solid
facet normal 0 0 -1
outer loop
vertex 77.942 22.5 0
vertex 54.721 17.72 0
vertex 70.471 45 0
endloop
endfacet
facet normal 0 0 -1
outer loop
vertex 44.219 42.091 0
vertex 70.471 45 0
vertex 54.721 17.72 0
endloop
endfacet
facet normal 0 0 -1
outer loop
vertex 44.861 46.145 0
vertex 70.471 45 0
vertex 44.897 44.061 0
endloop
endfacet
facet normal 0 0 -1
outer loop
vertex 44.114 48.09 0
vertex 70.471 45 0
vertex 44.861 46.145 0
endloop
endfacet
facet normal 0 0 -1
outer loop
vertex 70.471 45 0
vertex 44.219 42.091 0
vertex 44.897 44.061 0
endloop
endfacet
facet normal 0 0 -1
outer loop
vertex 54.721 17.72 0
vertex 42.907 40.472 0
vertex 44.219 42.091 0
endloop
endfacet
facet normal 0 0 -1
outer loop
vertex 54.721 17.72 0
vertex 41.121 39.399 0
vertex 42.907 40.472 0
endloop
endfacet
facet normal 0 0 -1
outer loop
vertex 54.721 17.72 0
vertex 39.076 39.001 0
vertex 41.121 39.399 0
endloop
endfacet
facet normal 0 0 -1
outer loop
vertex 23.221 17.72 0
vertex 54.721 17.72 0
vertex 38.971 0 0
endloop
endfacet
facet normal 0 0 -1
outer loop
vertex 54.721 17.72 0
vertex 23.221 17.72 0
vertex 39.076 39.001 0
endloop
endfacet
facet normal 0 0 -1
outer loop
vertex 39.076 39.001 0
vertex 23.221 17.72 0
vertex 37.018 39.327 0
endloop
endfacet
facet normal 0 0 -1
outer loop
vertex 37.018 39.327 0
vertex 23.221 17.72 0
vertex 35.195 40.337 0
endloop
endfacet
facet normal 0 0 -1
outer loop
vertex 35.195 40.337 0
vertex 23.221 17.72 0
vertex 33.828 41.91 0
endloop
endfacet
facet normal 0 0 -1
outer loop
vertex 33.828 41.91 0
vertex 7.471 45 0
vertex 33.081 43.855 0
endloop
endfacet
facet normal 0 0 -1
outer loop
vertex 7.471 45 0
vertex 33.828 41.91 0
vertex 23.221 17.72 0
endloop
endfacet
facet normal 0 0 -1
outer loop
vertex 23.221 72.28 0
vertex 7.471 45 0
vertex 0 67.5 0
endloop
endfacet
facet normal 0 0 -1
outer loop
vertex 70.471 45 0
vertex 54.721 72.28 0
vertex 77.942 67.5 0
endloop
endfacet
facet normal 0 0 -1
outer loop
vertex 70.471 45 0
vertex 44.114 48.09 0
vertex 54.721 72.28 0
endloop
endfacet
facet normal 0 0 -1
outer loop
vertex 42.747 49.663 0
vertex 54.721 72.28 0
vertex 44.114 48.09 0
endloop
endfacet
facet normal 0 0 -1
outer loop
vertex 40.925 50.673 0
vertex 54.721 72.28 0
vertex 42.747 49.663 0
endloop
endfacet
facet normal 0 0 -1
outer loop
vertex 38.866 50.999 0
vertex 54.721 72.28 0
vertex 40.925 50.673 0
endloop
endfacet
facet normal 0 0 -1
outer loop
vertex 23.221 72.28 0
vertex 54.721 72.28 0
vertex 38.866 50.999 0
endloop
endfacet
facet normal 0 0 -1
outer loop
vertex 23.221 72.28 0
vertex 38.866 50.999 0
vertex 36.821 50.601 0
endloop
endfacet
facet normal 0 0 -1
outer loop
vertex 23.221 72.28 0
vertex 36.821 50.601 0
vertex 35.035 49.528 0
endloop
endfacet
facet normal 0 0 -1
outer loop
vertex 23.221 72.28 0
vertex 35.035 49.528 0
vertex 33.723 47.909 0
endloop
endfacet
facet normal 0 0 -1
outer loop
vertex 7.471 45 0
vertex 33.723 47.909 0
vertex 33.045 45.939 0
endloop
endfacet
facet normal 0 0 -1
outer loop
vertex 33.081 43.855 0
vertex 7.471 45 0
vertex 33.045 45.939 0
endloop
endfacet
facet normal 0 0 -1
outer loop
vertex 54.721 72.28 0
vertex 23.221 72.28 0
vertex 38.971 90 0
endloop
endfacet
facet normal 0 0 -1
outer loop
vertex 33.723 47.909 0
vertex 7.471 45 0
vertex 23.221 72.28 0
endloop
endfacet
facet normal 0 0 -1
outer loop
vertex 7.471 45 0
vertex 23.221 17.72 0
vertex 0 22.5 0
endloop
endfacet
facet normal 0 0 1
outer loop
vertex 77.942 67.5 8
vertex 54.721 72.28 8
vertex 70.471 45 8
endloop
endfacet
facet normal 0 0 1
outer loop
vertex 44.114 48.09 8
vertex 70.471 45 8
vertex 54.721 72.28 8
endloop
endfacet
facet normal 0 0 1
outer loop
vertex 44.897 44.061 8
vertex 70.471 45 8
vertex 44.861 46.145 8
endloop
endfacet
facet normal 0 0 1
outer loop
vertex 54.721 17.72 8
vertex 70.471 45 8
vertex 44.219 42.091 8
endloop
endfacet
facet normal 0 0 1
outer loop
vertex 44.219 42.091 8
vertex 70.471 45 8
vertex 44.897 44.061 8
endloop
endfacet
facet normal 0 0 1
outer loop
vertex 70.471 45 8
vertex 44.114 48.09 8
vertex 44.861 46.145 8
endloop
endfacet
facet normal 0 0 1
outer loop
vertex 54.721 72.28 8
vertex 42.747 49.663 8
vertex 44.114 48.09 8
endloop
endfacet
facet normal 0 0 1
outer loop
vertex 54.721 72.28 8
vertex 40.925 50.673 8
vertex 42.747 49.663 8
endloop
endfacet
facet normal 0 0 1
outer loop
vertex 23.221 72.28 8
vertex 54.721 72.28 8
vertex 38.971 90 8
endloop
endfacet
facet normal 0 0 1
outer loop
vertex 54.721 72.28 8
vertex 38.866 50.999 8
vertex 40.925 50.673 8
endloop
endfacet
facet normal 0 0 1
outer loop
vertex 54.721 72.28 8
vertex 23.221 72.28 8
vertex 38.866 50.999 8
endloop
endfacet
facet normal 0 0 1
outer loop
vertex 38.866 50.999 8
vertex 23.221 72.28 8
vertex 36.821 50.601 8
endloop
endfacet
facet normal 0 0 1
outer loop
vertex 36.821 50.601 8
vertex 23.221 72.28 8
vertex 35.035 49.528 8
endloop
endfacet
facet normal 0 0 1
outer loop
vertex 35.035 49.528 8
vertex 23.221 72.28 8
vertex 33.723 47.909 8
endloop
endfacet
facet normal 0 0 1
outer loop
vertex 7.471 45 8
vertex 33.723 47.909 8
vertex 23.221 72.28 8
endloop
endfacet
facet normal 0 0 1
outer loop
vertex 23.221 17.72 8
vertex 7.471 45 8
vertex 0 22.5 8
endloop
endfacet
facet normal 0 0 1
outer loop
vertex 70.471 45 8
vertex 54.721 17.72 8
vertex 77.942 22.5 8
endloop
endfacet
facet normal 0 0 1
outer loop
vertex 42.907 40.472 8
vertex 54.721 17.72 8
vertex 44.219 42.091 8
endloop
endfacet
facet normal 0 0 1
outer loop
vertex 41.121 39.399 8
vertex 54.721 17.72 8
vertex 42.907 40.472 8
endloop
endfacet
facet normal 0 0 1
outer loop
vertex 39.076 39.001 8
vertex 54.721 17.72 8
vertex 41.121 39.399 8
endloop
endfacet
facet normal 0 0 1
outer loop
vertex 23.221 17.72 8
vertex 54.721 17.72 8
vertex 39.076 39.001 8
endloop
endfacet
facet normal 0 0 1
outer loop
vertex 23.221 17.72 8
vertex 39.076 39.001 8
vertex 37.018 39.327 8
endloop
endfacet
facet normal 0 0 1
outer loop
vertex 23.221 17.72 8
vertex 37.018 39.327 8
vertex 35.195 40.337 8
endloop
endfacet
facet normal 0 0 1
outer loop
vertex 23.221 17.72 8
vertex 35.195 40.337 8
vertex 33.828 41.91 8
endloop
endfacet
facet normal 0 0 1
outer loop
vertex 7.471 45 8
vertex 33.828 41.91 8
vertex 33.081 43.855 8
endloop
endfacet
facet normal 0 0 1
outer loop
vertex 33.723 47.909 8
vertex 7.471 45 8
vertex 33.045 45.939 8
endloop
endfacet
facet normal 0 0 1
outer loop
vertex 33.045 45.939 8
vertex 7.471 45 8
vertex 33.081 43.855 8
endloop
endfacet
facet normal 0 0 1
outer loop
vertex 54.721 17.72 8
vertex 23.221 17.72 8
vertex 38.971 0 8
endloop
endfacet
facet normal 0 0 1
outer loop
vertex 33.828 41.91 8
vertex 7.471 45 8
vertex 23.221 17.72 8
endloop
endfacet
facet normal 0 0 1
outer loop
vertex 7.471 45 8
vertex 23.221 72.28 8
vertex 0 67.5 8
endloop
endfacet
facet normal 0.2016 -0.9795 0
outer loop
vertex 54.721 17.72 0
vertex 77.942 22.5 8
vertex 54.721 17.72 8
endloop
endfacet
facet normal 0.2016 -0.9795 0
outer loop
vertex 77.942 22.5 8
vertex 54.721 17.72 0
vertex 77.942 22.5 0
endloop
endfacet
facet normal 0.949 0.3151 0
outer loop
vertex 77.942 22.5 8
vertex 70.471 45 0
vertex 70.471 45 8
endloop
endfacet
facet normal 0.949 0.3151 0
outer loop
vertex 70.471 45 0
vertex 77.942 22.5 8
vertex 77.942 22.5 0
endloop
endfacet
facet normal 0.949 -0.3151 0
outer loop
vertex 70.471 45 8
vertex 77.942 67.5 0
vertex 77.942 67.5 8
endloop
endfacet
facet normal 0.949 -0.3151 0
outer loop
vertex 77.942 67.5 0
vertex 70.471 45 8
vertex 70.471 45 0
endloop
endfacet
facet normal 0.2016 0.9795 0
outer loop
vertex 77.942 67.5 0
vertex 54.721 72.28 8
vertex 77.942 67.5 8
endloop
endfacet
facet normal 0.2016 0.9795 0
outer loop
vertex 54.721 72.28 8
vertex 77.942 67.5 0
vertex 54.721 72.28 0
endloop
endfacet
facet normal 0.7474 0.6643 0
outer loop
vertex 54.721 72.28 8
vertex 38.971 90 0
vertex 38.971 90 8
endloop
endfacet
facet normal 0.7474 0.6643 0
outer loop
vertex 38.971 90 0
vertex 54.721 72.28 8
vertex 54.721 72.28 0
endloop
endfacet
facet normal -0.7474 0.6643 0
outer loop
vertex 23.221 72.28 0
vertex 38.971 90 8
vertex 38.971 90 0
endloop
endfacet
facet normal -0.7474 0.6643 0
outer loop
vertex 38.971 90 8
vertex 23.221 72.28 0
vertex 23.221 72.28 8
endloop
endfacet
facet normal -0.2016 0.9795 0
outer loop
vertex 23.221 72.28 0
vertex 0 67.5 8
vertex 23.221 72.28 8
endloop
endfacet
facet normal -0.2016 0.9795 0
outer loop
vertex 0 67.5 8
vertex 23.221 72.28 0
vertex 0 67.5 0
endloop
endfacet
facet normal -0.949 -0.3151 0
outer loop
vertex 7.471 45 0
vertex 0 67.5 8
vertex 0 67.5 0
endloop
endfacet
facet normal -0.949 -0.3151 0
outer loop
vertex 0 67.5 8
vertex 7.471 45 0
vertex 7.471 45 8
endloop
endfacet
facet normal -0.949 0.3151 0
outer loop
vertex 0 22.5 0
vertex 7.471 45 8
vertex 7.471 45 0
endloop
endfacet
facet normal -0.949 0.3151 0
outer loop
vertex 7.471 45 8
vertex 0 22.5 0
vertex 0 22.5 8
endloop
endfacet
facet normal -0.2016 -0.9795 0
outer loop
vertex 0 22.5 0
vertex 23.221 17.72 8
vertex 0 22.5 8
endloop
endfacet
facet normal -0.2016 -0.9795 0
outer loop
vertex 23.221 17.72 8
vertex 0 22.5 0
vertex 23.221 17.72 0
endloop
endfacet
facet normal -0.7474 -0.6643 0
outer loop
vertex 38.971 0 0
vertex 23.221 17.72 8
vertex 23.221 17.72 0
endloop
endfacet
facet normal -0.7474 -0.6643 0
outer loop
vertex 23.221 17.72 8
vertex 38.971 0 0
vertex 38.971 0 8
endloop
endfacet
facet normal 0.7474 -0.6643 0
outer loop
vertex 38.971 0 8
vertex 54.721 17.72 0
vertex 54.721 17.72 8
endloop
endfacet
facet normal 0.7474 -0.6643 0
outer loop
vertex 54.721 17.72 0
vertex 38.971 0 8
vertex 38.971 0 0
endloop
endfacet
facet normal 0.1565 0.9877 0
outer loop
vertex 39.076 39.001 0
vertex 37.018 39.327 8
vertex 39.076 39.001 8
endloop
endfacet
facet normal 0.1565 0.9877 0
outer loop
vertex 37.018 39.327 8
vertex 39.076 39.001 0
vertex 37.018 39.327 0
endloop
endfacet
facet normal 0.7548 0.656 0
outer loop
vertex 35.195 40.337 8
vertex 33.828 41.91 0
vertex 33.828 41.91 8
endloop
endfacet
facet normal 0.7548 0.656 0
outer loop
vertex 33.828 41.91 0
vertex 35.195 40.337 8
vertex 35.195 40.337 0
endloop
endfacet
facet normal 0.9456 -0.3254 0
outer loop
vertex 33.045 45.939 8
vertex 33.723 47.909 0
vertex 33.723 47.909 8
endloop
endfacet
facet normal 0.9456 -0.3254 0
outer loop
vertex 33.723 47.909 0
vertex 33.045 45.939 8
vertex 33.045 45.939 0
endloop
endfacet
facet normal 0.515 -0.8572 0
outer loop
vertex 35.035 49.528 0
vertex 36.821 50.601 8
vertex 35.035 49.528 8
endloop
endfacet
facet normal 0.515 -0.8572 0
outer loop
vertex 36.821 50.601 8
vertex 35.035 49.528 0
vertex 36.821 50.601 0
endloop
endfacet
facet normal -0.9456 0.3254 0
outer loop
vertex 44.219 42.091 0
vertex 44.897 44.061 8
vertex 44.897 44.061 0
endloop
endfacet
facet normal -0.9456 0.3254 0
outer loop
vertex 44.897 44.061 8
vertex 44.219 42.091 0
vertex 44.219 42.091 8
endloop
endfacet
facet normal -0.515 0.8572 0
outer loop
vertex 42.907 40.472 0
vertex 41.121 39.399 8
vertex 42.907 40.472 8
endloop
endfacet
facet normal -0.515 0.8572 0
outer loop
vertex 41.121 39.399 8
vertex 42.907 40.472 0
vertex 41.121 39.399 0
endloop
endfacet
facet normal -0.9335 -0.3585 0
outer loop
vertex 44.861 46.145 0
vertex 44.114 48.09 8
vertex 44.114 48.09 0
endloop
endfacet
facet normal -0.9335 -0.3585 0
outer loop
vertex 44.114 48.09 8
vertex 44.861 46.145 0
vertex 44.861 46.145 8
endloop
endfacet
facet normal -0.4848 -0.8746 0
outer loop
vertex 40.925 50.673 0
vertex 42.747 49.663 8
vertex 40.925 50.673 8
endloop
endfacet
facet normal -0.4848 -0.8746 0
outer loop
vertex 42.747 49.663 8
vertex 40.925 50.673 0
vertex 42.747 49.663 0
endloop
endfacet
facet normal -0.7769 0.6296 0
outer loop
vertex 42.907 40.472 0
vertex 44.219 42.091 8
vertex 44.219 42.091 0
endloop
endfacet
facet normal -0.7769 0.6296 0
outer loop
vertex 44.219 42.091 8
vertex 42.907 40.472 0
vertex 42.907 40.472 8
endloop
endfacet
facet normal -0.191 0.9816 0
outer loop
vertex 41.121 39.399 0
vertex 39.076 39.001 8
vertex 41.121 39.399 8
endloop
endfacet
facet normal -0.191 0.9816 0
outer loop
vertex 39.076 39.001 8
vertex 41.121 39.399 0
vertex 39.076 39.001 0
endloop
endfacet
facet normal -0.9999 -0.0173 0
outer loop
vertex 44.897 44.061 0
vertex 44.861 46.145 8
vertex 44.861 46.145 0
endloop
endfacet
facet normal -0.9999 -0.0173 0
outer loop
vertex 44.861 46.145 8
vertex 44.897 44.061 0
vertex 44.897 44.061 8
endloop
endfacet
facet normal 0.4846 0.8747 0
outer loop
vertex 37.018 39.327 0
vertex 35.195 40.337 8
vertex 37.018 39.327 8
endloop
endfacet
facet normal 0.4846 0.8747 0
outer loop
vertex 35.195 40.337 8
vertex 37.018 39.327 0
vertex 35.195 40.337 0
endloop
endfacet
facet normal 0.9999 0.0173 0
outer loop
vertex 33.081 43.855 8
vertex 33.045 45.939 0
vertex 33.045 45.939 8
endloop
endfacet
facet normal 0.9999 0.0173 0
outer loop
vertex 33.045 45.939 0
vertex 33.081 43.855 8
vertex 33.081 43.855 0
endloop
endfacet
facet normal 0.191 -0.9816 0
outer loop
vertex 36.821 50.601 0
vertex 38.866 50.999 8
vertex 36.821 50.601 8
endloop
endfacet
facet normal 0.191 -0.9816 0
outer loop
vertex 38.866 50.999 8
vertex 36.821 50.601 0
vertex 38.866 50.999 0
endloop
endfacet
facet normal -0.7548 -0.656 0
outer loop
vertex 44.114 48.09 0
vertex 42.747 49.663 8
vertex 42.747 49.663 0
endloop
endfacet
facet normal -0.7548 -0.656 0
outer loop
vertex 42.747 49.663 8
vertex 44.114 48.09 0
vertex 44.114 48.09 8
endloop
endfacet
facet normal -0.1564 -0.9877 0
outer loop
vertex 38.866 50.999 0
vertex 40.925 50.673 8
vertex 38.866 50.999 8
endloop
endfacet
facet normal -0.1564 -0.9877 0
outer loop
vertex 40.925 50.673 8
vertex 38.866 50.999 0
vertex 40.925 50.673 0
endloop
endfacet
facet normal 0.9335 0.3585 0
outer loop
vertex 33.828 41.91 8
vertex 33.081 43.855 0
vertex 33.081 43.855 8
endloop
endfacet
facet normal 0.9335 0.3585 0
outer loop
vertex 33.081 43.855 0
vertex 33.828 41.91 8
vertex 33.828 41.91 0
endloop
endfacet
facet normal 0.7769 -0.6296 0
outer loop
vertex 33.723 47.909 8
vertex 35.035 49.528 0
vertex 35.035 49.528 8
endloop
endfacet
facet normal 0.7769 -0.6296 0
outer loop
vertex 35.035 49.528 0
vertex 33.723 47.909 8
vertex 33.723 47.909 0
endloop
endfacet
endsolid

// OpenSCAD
$fn = 32;

// ----------------------------------------------------------------------
// Star wheel: 6-point blunt, R45
// ----------------------------------------------------------------------

// --- parameters (mm) ---
n_points = 6;             // number of points / teeth
r_out = 45;               // tip radius
r_in = 31.5;              // root radius
bore_r = 6;               // centre bore radius
plate_t = 8;              // plate thickness, Z (extrusion height)
bore_d = 12;              // centre bore diameter

profile = [[38.971, 90], [23.221, 72.28], [0, 67.5], [7.471, 45], [0, 22.5], [23.221, 17.72], [38.971, 0], [54.721, 17.72], [77.942, 22.5], [70.471, 45], [77.942, 67.5], [54.721, 72.28]];  // primary outline, 12 points, counter clockwise
void_1 = [[44.861, 46.145], [44.114, 48.09], [42.747, 49.663], [40.925, 50.673], [38.866, 50.999], [36.821, 50.601], [35.035, 49.528], [33.723, 47.909], [33.045, 45.939], [33.081, 43.855], [33.828, 41.91], [35.195, 40.337], [37.018, 39.327], [39.076, 39.001], [41.121, 39.399], [42.907, 40.472], [44.219, 42.091], [44.897, 44.061]];  // centre bore, 18 points

// --- the one profile operation ---
difference() {
  linear_extrude(height = plate_t) polygon(points = profile);
  translate([0, 0, -1])
    linear_extrude(height = plate_t + 2) polygon(points = void_1);
}
